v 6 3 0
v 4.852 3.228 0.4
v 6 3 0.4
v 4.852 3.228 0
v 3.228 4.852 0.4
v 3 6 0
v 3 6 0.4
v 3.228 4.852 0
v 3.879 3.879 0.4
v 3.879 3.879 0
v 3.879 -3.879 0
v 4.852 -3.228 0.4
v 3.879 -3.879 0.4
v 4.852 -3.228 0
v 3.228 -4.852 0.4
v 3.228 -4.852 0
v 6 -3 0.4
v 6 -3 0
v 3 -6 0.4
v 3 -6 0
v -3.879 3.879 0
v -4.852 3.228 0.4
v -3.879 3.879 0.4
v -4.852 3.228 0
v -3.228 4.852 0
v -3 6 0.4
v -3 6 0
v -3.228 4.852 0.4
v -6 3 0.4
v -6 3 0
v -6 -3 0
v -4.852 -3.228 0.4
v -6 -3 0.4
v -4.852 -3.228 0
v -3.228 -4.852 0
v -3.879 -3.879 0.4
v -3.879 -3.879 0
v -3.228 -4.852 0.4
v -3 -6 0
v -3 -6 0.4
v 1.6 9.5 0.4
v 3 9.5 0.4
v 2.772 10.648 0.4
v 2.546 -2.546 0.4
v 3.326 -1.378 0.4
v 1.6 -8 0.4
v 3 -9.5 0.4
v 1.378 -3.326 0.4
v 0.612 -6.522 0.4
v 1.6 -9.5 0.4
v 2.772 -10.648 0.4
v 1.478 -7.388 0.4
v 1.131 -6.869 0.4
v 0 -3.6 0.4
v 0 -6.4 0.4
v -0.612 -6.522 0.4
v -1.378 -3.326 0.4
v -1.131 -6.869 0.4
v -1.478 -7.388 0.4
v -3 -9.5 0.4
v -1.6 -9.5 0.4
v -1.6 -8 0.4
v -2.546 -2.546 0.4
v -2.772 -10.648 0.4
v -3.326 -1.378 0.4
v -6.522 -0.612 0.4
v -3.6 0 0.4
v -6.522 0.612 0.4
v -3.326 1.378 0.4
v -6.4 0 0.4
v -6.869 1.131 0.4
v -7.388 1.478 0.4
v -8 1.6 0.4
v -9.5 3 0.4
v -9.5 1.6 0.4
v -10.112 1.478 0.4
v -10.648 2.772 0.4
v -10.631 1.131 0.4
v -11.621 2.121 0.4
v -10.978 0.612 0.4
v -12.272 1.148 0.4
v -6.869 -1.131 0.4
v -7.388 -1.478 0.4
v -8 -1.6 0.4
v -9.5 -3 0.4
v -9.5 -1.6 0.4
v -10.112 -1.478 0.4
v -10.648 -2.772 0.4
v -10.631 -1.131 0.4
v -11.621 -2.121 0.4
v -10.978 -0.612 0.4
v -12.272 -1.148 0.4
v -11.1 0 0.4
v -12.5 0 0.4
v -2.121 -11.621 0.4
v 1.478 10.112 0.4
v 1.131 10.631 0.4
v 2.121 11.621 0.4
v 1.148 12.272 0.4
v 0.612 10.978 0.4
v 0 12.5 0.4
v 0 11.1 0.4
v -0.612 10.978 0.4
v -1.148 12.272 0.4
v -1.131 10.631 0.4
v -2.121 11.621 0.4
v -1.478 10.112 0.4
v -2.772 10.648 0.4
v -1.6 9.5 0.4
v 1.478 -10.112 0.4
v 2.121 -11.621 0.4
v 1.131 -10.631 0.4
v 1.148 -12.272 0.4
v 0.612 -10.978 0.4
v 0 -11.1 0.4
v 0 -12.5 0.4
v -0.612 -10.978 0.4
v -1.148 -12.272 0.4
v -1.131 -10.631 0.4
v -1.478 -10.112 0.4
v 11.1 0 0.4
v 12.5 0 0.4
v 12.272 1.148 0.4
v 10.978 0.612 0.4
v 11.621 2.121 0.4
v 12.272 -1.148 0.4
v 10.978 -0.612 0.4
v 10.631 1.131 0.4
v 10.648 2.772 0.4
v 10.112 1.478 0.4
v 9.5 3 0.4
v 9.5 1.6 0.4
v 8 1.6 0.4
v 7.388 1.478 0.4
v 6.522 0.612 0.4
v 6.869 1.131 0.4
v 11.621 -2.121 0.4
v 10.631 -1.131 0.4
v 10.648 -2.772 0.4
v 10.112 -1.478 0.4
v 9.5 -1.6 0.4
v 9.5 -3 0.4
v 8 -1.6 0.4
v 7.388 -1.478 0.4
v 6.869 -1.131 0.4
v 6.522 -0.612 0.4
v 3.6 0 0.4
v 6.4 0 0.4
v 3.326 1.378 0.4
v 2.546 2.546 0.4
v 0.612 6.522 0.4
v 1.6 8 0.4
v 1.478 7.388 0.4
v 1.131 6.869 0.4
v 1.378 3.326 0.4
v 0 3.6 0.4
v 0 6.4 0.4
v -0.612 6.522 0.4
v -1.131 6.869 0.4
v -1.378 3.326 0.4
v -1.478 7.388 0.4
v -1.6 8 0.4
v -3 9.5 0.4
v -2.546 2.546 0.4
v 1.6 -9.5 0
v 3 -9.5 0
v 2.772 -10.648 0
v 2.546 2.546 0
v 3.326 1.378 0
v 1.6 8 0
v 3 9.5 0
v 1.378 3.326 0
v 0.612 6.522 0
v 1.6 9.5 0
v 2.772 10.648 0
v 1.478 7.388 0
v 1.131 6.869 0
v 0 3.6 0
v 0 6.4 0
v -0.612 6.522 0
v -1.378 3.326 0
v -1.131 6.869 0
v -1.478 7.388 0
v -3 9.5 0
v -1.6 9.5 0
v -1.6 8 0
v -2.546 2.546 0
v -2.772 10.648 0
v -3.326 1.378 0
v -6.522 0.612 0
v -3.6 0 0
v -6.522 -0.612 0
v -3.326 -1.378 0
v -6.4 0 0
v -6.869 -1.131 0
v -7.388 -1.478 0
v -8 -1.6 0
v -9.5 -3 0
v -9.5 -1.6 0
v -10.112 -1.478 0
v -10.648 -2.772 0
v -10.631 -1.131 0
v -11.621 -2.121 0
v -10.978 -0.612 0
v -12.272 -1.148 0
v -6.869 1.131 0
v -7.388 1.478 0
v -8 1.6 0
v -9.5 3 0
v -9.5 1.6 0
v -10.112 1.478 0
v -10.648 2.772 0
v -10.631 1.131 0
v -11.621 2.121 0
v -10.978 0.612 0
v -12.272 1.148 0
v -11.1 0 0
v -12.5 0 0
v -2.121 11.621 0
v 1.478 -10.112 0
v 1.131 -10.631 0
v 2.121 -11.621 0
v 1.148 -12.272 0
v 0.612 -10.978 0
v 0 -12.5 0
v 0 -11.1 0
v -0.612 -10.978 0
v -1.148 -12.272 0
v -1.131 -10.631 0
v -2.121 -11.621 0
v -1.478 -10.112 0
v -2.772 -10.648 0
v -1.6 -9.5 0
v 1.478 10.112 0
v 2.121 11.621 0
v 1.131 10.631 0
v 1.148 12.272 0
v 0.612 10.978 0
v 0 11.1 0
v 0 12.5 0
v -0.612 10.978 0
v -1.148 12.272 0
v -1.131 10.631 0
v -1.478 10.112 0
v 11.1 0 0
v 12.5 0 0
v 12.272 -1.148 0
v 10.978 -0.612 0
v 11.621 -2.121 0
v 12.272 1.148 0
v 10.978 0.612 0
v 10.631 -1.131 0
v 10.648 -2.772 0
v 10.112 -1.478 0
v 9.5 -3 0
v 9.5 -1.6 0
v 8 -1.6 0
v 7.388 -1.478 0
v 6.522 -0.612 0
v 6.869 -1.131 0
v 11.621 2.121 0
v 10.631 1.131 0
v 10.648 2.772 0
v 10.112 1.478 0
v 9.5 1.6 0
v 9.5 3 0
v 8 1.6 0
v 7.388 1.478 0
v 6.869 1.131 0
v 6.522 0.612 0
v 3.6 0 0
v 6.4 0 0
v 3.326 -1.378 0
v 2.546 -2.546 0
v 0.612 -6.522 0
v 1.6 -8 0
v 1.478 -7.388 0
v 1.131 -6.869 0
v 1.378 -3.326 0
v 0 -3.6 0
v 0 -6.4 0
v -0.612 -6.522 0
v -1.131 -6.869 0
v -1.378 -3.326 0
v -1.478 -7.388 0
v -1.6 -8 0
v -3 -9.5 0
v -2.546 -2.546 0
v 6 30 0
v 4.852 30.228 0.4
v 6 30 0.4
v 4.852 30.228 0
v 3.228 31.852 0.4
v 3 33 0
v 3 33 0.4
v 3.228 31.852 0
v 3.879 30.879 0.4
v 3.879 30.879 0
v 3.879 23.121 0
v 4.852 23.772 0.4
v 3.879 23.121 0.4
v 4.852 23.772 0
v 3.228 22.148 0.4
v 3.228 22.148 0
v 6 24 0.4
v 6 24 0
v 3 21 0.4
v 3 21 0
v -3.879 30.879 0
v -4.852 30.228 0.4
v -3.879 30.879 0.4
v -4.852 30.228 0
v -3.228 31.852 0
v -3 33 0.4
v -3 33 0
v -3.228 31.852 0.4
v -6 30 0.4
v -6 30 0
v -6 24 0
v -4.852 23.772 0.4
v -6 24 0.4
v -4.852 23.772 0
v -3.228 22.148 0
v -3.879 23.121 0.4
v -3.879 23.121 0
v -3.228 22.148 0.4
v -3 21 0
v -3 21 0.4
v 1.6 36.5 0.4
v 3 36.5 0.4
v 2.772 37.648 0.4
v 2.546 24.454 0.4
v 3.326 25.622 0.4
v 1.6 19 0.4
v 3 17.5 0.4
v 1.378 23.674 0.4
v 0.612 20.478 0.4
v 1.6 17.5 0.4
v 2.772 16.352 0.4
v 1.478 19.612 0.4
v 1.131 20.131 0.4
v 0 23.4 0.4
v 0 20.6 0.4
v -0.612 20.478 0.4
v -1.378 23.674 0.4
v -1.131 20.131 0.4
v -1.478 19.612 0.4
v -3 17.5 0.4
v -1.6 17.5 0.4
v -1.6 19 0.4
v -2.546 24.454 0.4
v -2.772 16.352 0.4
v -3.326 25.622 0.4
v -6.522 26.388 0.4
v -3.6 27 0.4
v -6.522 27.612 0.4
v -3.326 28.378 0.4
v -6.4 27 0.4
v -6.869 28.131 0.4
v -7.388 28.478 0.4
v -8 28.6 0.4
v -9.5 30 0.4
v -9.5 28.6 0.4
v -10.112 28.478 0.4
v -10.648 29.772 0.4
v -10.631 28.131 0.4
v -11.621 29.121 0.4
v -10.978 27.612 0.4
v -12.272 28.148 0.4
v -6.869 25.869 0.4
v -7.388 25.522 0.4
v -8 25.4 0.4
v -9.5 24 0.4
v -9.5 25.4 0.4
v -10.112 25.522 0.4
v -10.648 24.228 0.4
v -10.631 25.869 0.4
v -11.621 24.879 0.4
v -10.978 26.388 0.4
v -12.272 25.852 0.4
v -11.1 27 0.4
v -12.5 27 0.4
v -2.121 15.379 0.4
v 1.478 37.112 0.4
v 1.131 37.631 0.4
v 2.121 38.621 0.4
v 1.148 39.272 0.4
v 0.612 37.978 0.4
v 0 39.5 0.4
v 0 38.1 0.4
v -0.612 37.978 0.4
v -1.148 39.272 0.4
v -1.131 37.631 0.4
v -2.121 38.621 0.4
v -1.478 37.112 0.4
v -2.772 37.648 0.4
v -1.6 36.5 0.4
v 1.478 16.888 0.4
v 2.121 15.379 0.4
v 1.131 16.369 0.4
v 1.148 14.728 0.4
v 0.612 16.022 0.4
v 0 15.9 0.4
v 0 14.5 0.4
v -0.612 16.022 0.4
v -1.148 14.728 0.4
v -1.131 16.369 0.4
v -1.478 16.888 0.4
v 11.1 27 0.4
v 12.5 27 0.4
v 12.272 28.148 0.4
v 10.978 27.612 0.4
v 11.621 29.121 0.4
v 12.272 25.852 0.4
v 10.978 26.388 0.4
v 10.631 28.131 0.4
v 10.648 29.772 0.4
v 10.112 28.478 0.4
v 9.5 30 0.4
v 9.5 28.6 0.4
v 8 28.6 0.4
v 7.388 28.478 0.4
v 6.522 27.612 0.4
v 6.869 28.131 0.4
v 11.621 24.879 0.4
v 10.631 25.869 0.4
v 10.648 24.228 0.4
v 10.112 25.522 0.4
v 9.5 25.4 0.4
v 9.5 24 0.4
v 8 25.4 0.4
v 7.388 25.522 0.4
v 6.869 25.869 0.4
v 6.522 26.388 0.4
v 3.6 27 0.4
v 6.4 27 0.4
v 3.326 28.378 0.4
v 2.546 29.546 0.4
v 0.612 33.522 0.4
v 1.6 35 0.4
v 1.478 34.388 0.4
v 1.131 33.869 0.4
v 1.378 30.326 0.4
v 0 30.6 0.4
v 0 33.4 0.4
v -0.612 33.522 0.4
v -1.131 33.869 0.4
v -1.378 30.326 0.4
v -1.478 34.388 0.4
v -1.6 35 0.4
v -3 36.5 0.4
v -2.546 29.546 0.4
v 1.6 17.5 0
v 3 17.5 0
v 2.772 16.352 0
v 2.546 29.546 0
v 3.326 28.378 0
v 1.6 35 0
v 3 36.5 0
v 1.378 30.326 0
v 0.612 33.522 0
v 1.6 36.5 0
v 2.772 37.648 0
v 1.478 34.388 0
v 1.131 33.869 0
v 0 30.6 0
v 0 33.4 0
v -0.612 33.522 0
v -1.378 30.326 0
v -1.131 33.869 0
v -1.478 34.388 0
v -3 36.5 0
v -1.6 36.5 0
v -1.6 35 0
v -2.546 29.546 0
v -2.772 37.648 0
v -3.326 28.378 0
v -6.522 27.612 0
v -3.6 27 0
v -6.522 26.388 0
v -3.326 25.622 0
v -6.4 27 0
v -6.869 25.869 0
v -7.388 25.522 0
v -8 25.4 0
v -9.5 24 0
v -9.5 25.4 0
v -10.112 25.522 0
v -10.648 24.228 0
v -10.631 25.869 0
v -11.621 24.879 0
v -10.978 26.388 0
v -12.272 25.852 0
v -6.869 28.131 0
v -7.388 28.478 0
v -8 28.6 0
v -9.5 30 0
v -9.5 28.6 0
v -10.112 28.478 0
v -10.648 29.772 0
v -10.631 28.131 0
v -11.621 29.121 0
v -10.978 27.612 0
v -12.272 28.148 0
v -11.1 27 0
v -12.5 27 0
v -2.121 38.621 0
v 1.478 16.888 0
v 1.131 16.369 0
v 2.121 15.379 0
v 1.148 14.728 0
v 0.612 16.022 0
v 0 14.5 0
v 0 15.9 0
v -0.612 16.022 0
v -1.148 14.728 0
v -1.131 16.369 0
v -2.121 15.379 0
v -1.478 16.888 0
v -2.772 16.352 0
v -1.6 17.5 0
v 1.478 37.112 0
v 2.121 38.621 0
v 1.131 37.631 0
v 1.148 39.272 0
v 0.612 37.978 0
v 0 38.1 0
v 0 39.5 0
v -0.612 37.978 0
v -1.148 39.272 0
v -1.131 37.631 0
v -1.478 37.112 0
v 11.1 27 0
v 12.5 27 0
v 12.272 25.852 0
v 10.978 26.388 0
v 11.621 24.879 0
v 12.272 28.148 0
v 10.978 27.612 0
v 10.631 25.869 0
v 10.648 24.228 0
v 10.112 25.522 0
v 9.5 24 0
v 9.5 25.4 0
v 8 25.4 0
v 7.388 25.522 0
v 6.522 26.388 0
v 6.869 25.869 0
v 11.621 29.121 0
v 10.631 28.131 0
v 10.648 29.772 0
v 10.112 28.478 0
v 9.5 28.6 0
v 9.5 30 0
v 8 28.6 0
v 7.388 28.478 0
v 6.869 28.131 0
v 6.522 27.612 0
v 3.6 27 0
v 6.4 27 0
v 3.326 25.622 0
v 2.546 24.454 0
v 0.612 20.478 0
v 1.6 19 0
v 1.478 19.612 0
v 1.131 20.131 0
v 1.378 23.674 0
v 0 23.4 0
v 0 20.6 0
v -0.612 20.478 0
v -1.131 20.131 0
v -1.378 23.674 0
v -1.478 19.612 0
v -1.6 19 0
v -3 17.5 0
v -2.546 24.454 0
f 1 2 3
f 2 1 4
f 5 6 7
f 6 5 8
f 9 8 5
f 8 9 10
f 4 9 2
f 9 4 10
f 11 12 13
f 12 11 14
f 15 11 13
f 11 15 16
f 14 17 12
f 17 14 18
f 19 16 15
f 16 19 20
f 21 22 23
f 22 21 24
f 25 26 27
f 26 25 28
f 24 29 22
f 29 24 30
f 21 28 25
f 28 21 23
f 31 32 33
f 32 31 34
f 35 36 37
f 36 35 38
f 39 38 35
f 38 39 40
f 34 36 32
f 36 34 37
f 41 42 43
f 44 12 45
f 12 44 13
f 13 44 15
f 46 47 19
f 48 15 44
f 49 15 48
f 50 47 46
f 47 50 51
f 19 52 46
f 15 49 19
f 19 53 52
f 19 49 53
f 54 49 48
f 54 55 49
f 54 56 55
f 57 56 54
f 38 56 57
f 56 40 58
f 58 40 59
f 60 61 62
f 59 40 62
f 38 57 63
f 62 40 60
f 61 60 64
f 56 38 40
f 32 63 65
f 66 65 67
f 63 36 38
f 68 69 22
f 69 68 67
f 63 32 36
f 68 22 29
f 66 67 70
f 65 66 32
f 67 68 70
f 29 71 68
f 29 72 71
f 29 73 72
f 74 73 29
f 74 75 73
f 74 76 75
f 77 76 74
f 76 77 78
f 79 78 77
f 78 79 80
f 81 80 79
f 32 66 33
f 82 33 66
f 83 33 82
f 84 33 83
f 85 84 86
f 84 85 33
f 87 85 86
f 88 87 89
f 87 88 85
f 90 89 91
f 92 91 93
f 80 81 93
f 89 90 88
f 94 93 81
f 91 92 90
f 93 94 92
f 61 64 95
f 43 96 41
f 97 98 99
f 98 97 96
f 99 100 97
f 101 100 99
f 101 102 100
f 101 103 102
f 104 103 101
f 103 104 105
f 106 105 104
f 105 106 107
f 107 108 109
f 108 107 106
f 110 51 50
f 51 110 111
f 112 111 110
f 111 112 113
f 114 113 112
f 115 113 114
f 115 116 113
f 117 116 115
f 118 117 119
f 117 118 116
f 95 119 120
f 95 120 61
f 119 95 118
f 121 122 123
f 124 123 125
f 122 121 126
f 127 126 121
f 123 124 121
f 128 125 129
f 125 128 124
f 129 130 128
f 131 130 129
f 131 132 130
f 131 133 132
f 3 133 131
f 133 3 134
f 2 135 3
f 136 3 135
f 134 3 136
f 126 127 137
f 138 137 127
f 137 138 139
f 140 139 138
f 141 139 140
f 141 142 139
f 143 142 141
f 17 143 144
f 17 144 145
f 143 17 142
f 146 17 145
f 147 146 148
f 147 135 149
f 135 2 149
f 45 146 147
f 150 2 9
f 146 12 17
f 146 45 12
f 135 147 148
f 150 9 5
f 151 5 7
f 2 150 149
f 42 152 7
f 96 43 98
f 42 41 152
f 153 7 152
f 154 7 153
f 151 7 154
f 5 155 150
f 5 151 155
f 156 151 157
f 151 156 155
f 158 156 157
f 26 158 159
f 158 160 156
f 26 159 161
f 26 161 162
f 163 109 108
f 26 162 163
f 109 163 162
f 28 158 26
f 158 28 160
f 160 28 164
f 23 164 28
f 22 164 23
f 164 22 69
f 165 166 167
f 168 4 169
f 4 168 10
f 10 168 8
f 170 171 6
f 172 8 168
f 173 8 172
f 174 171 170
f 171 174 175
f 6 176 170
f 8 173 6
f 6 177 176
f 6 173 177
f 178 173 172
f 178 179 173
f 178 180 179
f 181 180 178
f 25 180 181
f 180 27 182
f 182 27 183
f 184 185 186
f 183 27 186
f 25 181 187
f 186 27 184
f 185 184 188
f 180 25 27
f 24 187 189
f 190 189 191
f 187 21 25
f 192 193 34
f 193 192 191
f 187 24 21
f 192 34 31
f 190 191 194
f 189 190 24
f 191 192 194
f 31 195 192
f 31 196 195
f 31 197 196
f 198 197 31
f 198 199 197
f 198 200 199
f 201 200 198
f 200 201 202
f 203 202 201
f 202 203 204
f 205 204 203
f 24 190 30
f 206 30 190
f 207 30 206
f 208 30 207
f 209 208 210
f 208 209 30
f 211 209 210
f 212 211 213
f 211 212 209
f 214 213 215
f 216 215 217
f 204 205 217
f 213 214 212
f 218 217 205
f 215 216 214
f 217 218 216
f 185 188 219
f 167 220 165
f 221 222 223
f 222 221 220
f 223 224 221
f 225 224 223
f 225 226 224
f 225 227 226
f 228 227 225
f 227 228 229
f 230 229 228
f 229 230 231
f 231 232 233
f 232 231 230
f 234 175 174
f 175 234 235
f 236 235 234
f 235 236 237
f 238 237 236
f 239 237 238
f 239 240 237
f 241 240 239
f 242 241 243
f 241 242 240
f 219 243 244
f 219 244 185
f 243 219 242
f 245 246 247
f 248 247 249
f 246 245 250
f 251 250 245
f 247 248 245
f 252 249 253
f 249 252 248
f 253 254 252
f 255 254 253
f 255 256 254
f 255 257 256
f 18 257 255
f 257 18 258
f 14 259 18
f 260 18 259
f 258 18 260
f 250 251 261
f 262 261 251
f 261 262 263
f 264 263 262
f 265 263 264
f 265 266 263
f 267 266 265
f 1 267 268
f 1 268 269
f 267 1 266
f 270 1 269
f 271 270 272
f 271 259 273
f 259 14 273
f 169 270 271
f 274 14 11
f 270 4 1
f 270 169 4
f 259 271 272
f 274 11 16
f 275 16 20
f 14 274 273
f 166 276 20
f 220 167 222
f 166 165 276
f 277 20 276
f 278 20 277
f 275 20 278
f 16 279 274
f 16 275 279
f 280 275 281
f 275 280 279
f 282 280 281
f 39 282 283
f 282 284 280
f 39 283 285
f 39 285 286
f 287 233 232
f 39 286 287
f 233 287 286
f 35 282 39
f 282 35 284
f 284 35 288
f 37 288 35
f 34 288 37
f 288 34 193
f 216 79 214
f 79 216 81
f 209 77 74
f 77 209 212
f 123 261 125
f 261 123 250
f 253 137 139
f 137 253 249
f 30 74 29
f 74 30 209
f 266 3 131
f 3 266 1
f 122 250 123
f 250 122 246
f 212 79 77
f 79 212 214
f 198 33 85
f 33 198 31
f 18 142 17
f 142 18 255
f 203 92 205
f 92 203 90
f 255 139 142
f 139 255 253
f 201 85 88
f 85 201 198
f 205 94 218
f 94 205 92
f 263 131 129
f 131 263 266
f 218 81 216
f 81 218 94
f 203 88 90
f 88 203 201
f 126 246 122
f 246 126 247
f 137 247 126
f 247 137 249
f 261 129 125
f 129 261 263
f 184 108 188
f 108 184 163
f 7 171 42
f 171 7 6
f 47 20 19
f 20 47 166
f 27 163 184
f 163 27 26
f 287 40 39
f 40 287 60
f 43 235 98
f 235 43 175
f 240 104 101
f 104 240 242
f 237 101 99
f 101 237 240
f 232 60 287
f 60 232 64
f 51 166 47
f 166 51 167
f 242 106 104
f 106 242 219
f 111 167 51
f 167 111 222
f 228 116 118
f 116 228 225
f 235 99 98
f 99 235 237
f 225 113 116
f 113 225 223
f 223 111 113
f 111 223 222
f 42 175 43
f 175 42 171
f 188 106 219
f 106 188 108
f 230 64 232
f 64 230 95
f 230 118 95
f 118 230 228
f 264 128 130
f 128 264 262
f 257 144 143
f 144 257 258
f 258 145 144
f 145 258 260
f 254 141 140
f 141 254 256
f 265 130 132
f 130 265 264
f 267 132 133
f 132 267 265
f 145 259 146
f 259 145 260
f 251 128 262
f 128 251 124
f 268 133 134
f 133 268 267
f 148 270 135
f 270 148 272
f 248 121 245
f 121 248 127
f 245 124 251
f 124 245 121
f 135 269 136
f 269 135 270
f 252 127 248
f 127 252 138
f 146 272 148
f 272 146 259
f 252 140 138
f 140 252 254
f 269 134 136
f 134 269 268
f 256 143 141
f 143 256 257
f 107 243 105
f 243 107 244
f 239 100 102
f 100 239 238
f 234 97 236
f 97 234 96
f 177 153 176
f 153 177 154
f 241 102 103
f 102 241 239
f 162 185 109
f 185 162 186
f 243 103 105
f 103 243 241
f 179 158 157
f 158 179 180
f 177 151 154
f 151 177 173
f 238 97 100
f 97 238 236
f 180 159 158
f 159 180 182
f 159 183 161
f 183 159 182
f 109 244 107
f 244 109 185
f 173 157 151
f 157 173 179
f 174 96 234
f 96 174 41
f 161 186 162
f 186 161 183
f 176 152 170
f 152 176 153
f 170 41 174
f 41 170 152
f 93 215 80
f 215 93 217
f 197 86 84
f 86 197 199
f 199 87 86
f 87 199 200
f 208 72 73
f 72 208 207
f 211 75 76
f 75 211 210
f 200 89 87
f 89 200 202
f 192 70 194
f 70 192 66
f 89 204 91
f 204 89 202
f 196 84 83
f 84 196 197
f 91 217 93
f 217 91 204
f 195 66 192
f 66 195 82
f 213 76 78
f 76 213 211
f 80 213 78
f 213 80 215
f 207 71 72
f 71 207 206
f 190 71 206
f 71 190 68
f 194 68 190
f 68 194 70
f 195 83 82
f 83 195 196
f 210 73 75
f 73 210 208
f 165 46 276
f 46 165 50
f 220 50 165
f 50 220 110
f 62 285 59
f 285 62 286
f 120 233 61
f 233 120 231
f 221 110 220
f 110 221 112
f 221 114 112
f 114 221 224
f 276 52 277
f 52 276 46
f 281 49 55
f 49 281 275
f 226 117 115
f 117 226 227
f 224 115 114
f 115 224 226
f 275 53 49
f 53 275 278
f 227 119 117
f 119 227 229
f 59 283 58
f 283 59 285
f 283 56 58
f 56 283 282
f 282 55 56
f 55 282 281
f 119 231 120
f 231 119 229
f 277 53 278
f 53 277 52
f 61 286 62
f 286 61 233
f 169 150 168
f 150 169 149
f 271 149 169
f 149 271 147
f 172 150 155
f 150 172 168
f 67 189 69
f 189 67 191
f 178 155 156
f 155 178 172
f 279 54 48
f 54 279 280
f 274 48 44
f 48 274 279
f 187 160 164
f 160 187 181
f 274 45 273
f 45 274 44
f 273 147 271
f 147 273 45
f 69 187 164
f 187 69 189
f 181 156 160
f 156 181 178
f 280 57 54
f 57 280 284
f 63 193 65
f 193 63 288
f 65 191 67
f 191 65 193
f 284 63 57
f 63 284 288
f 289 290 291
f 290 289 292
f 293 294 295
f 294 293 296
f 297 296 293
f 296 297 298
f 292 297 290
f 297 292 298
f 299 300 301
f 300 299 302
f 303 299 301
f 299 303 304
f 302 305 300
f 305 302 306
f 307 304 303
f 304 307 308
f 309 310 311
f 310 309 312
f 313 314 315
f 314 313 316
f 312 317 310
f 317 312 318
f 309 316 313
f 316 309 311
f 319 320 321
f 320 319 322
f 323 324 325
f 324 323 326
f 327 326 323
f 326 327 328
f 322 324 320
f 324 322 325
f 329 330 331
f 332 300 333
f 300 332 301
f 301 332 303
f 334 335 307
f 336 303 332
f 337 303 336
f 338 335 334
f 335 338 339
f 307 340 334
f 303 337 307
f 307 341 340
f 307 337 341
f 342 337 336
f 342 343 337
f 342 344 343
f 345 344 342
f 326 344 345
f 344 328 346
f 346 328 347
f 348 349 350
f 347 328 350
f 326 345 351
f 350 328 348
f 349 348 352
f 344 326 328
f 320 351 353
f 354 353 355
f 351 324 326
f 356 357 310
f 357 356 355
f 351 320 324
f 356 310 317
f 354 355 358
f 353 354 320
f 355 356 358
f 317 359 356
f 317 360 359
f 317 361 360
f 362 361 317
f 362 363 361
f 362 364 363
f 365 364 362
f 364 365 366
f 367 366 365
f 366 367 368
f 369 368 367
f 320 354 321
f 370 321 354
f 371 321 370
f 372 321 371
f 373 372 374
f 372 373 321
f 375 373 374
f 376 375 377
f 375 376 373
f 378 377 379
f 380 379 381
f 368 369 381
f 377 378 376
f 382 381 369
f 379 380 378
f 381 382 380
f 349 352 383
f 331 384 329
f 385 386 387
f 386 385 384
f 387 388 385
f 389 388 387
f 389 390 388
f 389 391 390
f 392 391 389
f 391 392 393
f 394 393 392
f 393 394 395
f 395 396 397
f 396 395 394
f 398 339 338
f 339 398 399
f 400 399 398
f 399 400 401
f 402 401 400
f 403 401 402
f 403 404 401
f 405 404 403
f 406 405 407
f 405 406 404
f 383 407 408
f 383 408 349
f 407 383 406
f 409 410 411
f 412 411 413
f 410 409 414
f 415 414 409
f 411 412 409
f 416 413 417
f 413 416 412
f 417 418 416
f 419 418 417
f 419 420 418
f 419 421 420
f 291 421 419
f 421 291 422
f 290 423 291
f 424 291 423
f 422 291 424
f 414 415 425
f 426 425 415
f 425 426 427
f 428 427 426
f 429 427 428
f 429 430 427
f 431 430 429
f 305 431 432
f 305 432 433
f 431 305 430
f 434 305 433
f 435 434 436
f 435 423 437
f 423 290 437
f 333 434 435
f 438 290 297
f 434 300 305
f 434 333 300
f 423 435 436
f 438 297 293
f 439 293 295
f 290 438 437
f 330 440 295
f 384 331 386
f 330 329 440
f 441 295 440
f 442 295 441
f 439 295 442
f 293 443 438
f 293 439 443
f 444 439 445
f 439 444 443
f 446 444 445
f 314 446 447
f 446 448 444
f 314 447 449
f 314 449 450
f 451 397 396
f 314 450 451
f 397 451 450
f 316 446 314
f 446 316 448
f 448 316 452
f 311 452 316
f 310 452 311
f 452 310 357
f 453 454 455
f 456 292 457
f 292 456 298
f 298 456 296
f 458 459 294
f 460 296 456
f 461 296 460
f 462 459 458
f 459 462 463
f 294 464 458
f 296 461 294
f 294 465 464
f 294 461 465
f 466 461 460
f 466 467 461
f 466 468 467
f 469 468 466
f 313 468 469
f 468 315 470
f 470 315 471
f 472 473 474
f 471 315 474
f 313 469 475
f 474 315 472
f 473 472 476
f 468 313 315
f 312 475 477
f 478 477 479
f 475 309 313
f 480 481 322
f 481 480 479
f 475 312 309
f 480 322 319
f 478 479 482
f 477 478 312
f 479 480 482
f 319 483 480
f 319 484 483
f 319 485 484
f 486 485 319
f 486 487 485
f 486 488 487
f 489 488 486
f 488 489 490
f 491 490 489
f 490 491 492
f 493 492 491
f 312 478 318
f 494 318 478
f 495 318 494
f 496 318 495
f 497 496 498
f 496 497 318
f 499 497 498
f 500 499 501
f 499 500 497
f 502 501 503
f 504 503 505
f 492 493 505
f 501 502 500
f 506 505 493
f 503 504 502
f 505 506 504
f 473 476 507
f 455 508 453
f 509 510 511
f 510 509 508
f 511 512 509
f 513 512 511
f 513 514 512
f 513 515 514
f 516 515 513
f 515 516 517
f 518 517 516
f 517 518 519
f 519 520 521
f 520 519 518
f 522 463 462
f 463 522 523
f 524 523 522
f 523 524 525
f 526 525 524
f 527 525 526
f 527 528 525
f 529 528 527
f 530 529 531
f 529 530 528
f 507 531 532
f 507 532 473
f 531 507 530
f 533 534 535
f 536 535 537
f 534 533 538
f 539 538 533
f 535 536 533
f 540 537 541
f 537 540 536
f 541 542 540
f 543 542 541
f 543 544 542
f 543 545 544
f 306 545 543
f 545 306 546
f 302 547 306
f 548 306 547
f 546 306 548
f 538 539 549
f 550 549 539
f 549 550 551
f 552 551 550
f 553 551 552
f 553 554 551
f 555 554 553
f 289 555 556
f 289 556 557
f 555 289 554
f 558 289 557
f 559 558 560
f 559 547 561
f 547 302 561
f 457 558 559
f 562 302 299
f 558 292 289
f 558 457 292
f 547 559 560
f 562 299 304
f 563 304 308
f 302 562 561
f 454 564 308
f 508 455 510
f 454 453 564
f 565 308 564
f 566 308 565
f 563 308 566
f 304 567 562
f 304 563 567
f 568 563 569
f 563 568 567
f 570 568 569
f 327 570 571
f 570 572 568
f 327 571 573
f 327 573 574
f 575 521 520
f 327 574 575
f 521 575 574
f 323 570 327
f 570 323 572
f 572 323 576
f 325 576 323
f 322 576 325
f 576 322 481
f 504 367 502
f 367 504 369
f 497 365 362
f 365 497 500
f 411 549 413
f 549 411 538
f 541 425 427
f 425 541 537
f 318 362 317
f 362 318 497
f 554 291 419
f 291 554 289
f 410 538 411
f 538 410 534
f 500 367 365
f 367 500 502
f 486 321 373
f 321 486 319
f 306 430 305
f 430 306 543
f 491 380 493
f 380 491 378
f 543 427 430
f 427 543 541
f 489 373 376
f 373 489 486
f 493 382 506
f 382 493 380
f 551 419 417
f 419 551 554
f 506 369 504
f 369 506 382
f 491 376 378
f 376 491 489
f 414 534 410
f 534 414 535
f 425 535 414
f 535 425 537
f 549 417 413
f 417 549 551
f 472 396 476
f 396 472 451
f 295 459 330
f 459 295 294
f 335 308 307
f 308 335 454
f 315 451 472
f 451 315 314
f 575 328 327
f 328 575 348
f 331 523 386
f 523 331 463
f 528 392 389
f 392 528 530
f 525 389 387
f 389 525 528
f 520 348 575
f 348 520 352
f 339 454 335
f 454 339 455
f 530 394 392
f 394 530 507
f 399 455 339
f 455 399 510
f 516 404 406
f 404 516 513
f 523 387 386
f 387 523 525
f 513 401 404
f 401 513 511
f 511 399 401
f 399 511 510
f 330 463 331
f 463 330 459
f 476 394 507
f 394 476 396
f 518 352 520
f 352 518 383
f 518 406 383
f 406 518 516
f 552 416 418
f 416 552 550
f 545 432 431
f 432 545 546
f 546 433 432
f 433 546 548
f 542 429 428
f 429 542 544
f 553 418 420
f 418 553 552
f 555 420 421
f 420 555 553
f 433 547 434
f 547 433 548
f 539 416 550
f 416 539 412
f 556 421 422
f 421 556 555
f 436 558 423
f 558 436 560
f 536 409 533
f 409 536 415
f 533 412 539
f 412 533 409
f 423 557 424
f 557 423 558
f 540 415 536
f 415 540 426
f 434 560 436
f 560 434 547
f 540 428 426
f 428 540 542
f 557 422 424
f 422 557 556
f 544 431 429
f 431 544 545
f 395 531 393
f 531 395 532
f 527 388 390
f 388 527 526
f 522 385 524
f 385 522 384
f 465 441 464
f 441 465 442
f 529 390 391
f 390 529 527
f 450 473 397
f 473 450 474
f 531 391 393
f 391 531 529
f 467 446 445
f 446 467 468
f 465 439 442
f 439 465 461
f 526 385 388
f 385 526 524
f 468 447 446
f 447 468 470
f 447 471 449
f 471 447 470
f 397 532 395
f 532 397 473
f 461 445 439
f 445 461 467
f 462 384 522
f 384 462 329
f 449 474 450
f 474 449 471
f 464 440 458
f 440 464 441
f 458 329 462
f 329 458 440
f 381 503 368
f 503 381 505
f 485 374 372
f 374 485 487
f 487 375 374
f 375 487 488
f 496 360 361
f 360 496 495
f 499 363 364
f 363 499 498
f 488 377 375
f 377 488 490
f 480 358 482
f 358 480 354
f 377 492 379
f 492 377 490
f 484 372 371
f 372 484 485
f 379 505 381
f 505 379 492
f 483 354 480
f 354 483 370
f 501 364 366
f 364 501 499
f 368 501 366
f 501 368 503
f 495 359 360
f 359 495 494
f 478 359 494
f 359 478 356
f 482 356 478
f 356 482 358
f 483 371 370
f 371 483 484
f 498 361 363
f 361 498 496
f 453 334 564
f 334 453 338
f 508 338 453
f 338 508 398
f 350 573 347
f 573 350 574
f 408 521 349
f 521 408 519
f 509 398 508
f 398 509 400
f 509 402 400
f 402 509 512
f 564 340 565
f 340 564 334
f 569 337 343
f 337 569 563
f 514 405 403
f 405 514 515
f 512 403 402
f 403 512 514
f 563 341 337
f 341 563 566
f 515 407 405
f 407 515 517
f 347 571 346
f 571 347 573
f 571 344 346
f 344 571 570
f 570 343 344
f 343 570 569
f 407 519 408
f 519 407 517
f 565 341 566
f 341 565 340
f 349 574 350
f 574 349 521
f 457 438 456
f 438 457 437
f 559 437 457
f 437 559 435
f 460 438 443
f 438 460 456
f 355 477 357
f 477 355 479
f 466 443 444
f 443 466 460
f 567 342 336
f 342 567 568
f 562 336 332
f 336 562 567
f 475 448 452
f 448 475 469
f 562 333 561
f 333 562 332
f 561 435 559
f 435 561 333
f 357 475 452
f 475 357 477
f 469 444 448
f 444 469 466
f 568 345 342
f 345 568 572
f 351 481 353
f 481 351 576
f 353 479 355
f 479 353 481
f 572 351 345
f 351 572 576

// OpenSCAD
/* [General] */

// Two per motor (one on each side of the frame) is recommended.
count = 2; // [1:16]

/* [Slicer Setup] */

// Try to match your printer's nozzle
nozzle_diameter = 0.4;

// Set to the layer thickness you will use in your slicer.
layer_thickness = 0.2;

// Recommended: 2 or 3 depending on layer thickness
layer_count = 2;

/* [Motor Setup] */

// Make sure it is big enough to not bind the motor c-clip.
center_hole_diameter = 7;

// Recommend adding 0.15-0.25 depending on your printer.
screw_hole_diameter = 3.15;

// This is center-to-center distance of two opposing screws
mounting_pattern_diameter_1 = 19.0;

// This is center-to-center distance of the other pair of screws
mounting_pattern_diameter_2 = 16.0;

// Recommend adding 0.25 or more if using washers
screw_head_diameter = 5.75;

/* [Advanced] */

// Resolution of circles (lower renders faster)
resolution = 16; // [16:Low, 32:Med, 64:High]

// Multiplier that effects the radius of the inner corner. 1.0 makes it the same as screw_head_diameter.
inner_corner_multiplier = 1.0;

/* [Hidden] */

$fn = resolution;

// Calculated

height = layer_thickness * layer_count;
motor_mount_max_r = max(mounting_pattern_diameter_1,mounting_pattern_diameter_2)/2;
motor_mount_min_r = min(mounting_pattern_diameter_1,mounting_pattern_diameter_2)/2;

// Round up to ensure no partial lines (based on nozzle_diameter)

function round_up_to_nearest_multiple(val, num) = num * ceil(val/num);
screw_hole_diameter_rounded = round_up_to_nearest_multiple(screw_hole_diameter, nozzle_diameter);
screw_head_diameter_rounded = round_up_to_nearest_multiple(screw_head_diameter, nozzle_diameter);
center_hole_diameter_rounded = round_up_to_nearest_multiple(center_hole_diameter, nozzle_diameter);

inner_corner_d = round_up_to_nearest_multiple((screw_head_diameter * inner_corner_multiplier), nozzle_diameter);
corner_offset = (screw_head_diameter_rounded + inner_corner_d) / 2;

module primary_form() {
  difference() {
    translate([0,0,height/2]) cube([corner_offset*2, corner_offset*2, height], center=true);

    for(v=[[corner_offset,corner_offset,-0.1],
            [corner_offset,-corner_offset,-0.1],
            [-corner_offset,corner_offset,-0.1],
            [-corner_offset,-corner_offset,-0.1]])
      translate(v) cylinder(d=inner_corner_d, h=height+0.2);
  }

  hull() {
    translate([motor_mount_max_r,0,0]) cylinder(d=screw_head_diameter_rounded, h=height);
    translate([-motor_mount_max_r,0,0]) cylinder(d=screw_head_diameter_rounded, h=height);
  }

  hull() {
    translate([0,motor_mount_max_r,0]) cylinder(d=screw_head_diameter_rounded, h=height);
    translate([0,-motor_mount_max_r,0]) cylinder(d=screw_head_diameter_rounded, h=height);
  }
}

module center_cutout() {
  cylinder(d=center_hole_diameter_rounded, h=height*2+0.1, center=true);
}

module screws_cutout() {
  for(i=[0:3]) {
    rotate([0,0,i*90]) {
      hull() {
        translate([motor_mount_max_r,0,0]) cylinder(d=screw_hole_diameter_rounded, h=height*2+0.1, center=true);
        translate([motor_mount_min_r,0,0]) cylinder(d=screw_hole_diameter_rounded, h=height*2+0.1, center=true);
      }
    }
  }
}

module soft_mount() {
  difference() {
    primary_form();
    center_cutout();
    screws_cutout();
  }
}

rows = ceil(sqrt(count));
cols = ceil(sqrt(count));
outside_d = motor_mount_max_r*2 + screw_head_diameter_rounded + 1;
for(i=[0:count-1]) {
  x_offset = floor(i/rows)*(outside_d+1);
  y_offset = floor(i % cols)*(outside_d+1);

  translate([x_offset, y_offset, 0]) soft_mount();
}

/* A few useful presets:
 *   11xx motors:
 *     - center_hole_diameter = 4;
 *     - screw_hole_diameter = 2.25;
 *     - mounting_pattern_diameter_1 = 9.0;
 *     - mounting_pattern_diameter_2 = 9.0;
 *     - screw_head_diameter = 4.25;
 *
 *   2204-2206 motors:
 *     - center_hole_diameter = 7;
 *     - screw_hole_diameter = 3.15;
 *     - mounting_pattern_diameter_1 = 16.0;
 *     - mounting_pattern_diameter_2 = 19.0;
 *     - screw_head_diameter = 5.75;
 */
